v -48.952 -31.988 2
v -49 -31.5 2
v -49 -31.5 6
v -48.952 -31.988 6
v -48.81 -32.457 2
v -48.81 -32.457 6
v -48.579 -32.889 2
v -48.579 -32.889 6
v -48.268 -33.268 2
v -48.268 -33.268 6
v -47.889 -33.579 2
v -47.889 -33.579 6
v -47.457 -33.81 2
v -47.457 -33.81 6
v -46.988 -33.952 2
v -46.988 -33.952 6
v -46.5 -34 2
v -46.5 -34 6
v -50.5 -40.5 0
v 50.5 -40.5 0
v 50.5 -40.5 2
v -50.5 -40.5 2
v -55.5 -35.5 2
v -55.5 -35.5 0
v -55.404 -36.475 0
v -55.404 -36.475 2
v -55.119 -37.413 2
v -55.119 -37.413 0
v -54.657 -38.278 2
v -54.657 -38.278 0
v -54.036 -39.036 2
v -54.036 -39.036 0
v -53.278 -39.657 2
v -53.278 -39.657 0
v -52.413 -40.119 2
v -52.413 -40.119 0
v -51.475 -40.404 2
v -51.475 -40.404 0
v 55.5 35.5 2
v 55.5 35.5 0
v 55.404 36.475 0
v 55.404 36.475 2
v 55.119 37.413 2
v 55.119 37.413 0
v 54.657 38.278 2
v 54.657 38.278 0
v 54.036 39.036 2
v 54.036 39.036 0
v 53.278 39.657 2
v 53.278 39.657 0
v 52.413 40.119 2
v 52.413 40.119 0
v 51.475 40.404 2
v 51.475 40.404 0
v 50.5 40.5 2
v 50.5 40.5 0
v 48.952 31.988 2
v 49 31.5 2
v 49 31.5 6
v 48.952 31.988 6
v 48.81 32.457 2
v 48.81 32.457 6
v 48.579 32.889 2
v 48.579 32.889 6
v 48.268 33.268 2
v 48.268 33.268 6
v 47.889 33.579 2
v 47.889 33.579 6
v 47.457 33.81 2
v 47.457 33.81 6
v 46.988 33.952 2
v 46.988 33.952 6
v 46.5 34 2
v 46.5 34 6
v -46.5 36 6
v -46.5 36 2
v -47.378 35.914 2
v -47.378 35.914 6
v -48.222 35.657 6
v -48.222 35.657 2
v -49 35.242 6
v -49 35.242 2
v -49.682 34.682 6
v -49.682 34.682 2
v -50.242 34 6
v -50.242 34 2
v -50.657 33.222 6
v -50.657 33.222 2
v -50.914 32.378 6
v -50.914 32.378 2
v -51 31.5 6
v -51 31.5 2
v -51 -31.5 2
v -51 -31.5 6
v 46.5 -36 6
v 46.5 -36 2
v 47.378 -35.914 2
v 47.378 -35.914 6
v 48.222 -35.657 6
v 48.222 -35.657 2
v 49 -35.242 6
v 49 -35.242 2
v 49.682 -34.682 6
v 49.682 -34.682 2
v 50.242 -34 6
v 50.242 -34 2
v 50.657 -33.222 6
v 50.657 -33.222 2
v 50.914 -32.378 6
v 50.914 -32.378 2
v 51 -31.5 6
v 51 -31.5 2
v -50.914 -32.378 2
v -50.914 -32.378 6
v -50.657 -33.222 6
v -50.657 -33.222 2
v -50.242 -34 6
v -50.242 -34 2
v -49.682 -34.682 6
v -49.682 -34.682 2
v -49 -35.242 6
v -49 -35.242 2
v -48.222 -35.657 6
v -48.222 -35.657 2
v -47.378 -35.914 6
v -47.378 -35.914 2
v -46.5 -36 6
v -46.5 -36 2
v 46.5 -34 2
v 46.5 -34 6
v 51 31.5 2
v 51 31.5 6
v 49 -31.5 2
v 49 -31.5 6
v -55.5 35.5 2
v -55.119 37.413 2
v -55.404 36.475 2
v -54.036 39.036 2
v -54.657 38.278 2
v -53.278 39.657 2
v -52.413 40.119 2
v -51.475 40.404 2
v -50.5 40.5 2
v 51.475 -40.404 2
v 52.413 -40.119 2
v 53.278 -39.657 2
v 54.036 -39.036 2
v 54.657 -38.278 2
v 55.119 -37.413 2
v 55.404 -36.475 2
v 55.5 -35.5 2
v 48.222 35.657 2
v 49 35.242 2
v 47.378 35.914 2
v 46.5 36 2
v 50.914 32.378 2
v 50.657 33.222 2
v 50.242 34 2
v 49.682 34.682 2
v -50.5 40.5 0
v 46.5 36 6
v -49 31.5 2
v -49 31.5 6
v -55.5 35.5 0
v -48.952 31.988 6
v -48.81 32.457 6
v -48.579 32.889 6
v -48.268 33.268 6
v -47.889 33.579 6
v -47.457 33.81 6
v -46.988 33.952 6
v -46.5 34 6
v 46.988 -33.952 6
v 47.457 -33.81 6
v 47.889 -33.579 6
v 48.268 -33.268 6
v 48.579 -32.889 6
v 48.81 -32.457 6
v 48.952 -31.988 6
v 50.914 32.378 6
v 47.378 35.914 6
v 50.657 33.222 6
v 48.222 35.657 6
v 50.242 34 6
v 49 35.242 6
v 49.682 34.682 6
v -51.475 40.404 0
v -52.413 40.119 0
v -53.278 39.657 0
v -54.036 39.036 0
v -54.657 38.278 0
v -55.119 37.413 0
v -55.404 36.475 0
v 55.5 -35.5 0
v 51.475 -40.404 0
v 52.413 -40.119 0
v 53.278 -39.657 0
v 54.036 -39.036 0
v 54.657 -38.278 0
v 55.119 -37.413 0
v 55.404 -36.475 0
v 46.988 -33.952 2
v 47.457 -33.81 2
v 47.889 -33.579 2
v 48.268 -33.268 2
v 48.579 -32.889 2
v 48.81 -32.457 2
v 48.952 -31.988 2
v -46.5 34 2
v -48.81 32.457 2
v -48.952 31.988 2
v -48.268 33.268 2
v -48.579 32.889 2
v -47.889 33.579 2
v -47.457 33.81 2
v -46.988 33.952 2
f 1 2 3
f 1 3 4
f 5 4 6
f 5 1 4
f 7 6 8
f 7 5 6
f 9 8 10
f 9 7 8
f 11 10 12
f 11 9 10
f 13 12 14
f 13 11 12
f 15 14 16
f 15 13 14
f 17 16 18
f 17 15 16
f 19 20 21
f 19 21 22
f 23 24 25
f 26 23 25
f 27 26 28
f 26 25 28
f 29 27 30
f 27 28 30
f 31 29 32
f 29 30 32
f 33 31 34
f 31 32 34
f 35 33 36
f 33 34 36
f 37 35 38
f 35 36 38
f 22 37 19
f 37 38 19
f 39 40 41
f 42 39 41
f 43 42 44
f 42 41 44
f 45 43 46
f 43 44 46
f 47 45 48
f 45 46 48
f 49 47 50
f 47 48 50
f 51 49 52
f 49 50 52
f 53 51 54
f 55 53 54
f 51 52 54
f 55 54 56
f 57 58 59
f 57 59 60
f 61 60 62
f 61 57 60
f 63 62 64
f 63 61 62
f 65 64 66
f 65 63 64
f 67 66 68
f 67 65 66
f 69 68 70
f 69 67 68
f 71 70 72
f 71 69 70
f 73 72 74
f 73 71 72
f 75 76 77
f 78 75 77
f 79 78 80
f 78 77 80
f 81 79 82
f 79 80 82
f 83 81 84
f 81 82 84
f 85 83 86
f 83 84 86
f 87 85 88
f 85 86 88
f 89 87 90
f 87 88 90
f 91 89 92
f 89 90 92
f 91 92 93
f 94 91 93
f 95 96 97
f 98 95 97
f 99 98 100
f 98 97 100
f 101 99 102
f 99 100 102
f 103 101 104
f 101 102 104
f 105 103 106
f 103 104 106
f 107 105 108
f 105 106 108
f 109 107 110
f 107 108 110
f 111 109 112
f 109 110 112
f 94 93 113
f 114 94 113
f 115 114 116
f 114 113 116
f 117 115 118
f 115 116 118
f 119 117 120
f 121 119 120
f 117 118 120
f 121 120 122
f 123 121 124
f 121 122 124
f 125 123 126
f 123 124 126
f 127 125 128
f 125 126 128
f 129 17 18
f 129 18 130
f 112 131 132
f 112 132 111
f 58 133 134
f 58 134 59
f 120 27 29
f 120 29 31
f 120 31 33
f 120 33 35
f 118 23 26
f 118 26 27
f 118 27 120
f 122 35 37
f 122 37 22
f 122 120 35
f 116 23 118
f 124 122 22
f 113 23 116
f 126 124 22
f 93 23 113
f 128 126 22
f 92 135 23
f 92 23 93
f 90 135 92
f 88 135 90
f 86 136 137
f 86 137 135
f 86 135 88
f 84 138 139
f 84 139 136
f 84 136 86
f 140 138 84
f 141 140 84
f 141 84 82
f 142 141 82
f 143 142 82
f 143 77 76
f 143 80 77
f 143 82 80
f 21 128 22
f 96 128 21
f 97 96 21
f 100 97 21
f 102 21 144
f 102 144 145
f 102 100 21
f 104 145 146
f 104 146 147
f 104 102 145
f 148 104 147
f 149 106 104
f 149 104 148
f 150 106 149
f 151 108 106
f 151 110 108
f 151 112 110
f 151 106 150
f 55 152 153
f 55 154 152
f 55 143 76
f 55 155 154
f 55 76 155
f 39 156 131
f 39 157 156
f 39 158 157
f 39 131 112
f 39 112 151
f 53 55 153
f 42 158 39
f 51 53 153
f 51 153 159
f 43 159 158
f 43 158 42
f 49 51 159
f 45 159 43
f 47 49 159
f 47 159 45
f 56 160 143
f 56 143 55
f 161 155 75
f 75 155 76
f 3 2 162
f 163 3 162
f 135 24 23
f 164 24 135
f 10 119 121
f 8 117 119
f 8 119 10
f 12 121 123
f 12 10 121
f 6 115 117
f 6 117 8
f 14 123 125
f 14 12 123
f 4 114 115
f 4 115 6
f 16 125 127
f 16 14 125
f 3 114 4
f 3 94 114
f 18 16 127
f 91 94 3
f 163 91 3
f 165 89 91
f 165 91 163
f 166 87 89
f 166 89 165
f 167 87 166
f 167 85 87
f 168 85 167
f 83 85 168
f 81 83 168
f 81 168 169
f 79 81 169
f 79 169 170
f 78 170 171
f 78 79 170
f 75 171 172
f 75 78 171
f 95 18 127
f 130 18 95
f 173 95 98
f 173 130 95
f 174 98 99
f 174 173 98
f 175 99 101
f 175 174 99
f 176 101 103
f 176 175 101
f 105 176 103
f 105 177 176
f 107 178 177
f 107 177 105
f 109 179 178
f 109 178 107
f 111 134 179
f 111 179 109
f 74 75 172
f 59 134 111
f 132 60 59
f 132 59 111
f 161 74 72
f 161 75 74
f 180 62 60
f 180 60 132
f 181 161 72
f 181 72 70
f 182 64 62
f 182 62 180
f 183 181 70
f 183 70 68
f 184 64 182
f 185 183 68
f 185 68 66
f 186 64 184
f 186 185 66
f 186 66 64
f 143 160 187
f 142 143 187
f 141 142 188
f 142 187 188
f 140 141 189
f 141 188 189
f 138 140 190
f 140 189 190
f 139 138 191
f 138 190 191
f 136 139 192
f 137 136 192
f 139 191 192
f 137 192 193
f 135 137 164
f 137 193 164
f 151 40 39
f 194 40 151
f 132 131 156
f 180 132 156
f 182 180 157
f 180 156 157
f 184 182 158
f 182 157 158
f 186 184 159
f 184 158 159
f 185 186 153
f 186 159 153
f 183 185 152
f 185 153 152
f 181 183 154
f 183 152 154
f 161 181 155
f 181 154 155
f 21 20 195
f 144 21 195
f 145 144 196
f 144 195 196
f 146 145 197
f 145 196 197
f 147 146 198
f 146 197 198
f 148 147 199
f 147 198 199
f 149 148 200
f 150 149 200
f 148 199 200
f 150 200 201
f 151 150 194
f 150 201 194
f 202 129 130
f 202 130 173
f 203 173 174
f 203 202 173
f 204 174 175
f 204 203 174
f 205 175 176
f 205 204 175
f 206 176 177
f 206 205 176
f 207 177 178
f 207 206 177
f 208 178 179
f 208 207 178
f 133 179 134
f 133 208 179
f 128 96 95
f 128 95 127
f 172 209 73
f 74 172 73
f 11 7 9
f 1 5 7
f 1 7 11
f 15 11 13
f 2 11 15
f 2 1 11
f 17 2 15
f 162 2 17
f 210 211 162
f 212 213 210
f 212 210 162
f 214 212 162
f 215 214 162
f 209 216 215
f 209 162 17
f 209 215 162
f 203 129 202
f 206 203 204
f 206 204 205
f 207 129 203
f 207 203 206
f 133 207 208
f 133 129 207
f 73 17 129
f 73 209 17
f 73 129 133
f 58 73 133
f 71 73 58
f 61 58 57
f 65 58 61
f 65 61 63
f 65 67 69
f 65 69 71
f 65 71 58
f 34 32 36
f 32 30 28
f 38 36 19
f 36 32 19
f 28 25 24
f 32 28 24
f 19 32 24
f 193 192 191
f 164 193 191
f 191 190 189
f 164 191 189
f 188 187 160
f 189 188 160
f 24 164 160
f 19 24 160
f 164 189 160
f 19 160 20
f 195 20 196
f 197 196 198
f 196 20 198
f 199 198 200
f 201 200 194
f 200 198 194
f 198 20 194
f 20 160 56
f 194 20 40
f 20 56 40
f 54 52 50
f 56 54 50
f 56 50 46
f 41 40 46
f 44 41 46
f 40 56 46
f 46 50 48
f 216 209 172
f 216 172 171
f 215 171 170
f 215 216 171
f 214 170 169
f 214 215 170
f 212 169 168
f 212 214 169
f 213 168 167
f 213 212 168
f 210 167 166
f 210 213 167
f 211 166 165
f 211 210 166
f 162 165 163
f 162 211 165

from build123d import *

# Parameters (mm, degrees)
PAD_DEPTH    = 2
PAD001_DEPTH = 4


with BuildPart() as part:
    # Sketch → Pad (new body)
    with BuildSketch(Plane.XY):
        with BuildLine():
            ThreePointArc((-50.500002, 40.499998), (-54.035539, 39.035536), (-55.50001, 35.500002))
            Line((-55.50001, -35.499998), (-55.50001, 35.500002))
            ThreePointArc((-55.50001, -35.499998), (-54.035544, -39.035532), (-50.50001, -40.499998))
            Line((50.49999, -40.499998), (-50.50001, -40.499998))
            ThreePointArc((50.49999, -40.499998), (54.035535, -39.03554), (55.50001, -35.500002))
            Line((55.50001, 35.499998), (55.50001, -35.500002))
            ThreePointArc((55.50001, 35.499998), (54.03554, 39.035536), (50.499998, 40.499998))
            Line((-50.500002, 40.499998), (50.499998, 40.499998))
        make_face()
    extrude(amount=PAD_DEPTH)

    # Sketch001 (on Face10 of Pad) → Pad001 (join)
    with BuildSketch(Plane.XY.offset(2)):
        with BuildLine():
            ThreePointArc((50.999999, 31.5), (49.68198, 34.68198), (46.500001, 36))
            Line((46.500001, 36), (-46.499999, 36))
            ThreePointArc((-46.499999, 36), (-49.68198, 34.68198), (-50.999999, 31.5))
            Line((-50.999999, 31.5), (-50.999999, -31.500002))
            ThreePointArc((-50.999999, -31.500002), (-49.681979, -34.681981), (-46.5, -36))
            Line((46.499999, -36), (-46.5, -36))
            ThreePointArc((46.499999, -36), (49.68198, -34.68198), (50.999999, -31.5))
            Line((50.999999, 31.5), (50.999999, -31.5))
        make_face()
        with BuildLine():
            ThreePointArc((-46.499999, 34), (-48.267766, 33.267767), (-48.999999, 31.5))
            Line((-48.999999, -31.500002), (-48.999999, 31.5))
            ThreePointArc((-48.999999, -31.500002), (-48.267765, -33.267769), (-46.499997, -34))
            Line((-46.499997, -34), (46.499999, -34))
            ThreePointArc((46.499999, -34), (48.267766, -33.267767), (48.999999, -31.5))
            Line((48.999999, -31.5), (48.999999, 31.499997))
            ThreePointArc((48.999999, 31.499997), (48.267765, 33.267768), (46.499994, 34))
            Line((-46.499999, 34), (46.499994, 34))
        make_face(mode=Mode.SUBTRACT)
    extrude(amount=PAD001_DEPTH)


solid = part.part
